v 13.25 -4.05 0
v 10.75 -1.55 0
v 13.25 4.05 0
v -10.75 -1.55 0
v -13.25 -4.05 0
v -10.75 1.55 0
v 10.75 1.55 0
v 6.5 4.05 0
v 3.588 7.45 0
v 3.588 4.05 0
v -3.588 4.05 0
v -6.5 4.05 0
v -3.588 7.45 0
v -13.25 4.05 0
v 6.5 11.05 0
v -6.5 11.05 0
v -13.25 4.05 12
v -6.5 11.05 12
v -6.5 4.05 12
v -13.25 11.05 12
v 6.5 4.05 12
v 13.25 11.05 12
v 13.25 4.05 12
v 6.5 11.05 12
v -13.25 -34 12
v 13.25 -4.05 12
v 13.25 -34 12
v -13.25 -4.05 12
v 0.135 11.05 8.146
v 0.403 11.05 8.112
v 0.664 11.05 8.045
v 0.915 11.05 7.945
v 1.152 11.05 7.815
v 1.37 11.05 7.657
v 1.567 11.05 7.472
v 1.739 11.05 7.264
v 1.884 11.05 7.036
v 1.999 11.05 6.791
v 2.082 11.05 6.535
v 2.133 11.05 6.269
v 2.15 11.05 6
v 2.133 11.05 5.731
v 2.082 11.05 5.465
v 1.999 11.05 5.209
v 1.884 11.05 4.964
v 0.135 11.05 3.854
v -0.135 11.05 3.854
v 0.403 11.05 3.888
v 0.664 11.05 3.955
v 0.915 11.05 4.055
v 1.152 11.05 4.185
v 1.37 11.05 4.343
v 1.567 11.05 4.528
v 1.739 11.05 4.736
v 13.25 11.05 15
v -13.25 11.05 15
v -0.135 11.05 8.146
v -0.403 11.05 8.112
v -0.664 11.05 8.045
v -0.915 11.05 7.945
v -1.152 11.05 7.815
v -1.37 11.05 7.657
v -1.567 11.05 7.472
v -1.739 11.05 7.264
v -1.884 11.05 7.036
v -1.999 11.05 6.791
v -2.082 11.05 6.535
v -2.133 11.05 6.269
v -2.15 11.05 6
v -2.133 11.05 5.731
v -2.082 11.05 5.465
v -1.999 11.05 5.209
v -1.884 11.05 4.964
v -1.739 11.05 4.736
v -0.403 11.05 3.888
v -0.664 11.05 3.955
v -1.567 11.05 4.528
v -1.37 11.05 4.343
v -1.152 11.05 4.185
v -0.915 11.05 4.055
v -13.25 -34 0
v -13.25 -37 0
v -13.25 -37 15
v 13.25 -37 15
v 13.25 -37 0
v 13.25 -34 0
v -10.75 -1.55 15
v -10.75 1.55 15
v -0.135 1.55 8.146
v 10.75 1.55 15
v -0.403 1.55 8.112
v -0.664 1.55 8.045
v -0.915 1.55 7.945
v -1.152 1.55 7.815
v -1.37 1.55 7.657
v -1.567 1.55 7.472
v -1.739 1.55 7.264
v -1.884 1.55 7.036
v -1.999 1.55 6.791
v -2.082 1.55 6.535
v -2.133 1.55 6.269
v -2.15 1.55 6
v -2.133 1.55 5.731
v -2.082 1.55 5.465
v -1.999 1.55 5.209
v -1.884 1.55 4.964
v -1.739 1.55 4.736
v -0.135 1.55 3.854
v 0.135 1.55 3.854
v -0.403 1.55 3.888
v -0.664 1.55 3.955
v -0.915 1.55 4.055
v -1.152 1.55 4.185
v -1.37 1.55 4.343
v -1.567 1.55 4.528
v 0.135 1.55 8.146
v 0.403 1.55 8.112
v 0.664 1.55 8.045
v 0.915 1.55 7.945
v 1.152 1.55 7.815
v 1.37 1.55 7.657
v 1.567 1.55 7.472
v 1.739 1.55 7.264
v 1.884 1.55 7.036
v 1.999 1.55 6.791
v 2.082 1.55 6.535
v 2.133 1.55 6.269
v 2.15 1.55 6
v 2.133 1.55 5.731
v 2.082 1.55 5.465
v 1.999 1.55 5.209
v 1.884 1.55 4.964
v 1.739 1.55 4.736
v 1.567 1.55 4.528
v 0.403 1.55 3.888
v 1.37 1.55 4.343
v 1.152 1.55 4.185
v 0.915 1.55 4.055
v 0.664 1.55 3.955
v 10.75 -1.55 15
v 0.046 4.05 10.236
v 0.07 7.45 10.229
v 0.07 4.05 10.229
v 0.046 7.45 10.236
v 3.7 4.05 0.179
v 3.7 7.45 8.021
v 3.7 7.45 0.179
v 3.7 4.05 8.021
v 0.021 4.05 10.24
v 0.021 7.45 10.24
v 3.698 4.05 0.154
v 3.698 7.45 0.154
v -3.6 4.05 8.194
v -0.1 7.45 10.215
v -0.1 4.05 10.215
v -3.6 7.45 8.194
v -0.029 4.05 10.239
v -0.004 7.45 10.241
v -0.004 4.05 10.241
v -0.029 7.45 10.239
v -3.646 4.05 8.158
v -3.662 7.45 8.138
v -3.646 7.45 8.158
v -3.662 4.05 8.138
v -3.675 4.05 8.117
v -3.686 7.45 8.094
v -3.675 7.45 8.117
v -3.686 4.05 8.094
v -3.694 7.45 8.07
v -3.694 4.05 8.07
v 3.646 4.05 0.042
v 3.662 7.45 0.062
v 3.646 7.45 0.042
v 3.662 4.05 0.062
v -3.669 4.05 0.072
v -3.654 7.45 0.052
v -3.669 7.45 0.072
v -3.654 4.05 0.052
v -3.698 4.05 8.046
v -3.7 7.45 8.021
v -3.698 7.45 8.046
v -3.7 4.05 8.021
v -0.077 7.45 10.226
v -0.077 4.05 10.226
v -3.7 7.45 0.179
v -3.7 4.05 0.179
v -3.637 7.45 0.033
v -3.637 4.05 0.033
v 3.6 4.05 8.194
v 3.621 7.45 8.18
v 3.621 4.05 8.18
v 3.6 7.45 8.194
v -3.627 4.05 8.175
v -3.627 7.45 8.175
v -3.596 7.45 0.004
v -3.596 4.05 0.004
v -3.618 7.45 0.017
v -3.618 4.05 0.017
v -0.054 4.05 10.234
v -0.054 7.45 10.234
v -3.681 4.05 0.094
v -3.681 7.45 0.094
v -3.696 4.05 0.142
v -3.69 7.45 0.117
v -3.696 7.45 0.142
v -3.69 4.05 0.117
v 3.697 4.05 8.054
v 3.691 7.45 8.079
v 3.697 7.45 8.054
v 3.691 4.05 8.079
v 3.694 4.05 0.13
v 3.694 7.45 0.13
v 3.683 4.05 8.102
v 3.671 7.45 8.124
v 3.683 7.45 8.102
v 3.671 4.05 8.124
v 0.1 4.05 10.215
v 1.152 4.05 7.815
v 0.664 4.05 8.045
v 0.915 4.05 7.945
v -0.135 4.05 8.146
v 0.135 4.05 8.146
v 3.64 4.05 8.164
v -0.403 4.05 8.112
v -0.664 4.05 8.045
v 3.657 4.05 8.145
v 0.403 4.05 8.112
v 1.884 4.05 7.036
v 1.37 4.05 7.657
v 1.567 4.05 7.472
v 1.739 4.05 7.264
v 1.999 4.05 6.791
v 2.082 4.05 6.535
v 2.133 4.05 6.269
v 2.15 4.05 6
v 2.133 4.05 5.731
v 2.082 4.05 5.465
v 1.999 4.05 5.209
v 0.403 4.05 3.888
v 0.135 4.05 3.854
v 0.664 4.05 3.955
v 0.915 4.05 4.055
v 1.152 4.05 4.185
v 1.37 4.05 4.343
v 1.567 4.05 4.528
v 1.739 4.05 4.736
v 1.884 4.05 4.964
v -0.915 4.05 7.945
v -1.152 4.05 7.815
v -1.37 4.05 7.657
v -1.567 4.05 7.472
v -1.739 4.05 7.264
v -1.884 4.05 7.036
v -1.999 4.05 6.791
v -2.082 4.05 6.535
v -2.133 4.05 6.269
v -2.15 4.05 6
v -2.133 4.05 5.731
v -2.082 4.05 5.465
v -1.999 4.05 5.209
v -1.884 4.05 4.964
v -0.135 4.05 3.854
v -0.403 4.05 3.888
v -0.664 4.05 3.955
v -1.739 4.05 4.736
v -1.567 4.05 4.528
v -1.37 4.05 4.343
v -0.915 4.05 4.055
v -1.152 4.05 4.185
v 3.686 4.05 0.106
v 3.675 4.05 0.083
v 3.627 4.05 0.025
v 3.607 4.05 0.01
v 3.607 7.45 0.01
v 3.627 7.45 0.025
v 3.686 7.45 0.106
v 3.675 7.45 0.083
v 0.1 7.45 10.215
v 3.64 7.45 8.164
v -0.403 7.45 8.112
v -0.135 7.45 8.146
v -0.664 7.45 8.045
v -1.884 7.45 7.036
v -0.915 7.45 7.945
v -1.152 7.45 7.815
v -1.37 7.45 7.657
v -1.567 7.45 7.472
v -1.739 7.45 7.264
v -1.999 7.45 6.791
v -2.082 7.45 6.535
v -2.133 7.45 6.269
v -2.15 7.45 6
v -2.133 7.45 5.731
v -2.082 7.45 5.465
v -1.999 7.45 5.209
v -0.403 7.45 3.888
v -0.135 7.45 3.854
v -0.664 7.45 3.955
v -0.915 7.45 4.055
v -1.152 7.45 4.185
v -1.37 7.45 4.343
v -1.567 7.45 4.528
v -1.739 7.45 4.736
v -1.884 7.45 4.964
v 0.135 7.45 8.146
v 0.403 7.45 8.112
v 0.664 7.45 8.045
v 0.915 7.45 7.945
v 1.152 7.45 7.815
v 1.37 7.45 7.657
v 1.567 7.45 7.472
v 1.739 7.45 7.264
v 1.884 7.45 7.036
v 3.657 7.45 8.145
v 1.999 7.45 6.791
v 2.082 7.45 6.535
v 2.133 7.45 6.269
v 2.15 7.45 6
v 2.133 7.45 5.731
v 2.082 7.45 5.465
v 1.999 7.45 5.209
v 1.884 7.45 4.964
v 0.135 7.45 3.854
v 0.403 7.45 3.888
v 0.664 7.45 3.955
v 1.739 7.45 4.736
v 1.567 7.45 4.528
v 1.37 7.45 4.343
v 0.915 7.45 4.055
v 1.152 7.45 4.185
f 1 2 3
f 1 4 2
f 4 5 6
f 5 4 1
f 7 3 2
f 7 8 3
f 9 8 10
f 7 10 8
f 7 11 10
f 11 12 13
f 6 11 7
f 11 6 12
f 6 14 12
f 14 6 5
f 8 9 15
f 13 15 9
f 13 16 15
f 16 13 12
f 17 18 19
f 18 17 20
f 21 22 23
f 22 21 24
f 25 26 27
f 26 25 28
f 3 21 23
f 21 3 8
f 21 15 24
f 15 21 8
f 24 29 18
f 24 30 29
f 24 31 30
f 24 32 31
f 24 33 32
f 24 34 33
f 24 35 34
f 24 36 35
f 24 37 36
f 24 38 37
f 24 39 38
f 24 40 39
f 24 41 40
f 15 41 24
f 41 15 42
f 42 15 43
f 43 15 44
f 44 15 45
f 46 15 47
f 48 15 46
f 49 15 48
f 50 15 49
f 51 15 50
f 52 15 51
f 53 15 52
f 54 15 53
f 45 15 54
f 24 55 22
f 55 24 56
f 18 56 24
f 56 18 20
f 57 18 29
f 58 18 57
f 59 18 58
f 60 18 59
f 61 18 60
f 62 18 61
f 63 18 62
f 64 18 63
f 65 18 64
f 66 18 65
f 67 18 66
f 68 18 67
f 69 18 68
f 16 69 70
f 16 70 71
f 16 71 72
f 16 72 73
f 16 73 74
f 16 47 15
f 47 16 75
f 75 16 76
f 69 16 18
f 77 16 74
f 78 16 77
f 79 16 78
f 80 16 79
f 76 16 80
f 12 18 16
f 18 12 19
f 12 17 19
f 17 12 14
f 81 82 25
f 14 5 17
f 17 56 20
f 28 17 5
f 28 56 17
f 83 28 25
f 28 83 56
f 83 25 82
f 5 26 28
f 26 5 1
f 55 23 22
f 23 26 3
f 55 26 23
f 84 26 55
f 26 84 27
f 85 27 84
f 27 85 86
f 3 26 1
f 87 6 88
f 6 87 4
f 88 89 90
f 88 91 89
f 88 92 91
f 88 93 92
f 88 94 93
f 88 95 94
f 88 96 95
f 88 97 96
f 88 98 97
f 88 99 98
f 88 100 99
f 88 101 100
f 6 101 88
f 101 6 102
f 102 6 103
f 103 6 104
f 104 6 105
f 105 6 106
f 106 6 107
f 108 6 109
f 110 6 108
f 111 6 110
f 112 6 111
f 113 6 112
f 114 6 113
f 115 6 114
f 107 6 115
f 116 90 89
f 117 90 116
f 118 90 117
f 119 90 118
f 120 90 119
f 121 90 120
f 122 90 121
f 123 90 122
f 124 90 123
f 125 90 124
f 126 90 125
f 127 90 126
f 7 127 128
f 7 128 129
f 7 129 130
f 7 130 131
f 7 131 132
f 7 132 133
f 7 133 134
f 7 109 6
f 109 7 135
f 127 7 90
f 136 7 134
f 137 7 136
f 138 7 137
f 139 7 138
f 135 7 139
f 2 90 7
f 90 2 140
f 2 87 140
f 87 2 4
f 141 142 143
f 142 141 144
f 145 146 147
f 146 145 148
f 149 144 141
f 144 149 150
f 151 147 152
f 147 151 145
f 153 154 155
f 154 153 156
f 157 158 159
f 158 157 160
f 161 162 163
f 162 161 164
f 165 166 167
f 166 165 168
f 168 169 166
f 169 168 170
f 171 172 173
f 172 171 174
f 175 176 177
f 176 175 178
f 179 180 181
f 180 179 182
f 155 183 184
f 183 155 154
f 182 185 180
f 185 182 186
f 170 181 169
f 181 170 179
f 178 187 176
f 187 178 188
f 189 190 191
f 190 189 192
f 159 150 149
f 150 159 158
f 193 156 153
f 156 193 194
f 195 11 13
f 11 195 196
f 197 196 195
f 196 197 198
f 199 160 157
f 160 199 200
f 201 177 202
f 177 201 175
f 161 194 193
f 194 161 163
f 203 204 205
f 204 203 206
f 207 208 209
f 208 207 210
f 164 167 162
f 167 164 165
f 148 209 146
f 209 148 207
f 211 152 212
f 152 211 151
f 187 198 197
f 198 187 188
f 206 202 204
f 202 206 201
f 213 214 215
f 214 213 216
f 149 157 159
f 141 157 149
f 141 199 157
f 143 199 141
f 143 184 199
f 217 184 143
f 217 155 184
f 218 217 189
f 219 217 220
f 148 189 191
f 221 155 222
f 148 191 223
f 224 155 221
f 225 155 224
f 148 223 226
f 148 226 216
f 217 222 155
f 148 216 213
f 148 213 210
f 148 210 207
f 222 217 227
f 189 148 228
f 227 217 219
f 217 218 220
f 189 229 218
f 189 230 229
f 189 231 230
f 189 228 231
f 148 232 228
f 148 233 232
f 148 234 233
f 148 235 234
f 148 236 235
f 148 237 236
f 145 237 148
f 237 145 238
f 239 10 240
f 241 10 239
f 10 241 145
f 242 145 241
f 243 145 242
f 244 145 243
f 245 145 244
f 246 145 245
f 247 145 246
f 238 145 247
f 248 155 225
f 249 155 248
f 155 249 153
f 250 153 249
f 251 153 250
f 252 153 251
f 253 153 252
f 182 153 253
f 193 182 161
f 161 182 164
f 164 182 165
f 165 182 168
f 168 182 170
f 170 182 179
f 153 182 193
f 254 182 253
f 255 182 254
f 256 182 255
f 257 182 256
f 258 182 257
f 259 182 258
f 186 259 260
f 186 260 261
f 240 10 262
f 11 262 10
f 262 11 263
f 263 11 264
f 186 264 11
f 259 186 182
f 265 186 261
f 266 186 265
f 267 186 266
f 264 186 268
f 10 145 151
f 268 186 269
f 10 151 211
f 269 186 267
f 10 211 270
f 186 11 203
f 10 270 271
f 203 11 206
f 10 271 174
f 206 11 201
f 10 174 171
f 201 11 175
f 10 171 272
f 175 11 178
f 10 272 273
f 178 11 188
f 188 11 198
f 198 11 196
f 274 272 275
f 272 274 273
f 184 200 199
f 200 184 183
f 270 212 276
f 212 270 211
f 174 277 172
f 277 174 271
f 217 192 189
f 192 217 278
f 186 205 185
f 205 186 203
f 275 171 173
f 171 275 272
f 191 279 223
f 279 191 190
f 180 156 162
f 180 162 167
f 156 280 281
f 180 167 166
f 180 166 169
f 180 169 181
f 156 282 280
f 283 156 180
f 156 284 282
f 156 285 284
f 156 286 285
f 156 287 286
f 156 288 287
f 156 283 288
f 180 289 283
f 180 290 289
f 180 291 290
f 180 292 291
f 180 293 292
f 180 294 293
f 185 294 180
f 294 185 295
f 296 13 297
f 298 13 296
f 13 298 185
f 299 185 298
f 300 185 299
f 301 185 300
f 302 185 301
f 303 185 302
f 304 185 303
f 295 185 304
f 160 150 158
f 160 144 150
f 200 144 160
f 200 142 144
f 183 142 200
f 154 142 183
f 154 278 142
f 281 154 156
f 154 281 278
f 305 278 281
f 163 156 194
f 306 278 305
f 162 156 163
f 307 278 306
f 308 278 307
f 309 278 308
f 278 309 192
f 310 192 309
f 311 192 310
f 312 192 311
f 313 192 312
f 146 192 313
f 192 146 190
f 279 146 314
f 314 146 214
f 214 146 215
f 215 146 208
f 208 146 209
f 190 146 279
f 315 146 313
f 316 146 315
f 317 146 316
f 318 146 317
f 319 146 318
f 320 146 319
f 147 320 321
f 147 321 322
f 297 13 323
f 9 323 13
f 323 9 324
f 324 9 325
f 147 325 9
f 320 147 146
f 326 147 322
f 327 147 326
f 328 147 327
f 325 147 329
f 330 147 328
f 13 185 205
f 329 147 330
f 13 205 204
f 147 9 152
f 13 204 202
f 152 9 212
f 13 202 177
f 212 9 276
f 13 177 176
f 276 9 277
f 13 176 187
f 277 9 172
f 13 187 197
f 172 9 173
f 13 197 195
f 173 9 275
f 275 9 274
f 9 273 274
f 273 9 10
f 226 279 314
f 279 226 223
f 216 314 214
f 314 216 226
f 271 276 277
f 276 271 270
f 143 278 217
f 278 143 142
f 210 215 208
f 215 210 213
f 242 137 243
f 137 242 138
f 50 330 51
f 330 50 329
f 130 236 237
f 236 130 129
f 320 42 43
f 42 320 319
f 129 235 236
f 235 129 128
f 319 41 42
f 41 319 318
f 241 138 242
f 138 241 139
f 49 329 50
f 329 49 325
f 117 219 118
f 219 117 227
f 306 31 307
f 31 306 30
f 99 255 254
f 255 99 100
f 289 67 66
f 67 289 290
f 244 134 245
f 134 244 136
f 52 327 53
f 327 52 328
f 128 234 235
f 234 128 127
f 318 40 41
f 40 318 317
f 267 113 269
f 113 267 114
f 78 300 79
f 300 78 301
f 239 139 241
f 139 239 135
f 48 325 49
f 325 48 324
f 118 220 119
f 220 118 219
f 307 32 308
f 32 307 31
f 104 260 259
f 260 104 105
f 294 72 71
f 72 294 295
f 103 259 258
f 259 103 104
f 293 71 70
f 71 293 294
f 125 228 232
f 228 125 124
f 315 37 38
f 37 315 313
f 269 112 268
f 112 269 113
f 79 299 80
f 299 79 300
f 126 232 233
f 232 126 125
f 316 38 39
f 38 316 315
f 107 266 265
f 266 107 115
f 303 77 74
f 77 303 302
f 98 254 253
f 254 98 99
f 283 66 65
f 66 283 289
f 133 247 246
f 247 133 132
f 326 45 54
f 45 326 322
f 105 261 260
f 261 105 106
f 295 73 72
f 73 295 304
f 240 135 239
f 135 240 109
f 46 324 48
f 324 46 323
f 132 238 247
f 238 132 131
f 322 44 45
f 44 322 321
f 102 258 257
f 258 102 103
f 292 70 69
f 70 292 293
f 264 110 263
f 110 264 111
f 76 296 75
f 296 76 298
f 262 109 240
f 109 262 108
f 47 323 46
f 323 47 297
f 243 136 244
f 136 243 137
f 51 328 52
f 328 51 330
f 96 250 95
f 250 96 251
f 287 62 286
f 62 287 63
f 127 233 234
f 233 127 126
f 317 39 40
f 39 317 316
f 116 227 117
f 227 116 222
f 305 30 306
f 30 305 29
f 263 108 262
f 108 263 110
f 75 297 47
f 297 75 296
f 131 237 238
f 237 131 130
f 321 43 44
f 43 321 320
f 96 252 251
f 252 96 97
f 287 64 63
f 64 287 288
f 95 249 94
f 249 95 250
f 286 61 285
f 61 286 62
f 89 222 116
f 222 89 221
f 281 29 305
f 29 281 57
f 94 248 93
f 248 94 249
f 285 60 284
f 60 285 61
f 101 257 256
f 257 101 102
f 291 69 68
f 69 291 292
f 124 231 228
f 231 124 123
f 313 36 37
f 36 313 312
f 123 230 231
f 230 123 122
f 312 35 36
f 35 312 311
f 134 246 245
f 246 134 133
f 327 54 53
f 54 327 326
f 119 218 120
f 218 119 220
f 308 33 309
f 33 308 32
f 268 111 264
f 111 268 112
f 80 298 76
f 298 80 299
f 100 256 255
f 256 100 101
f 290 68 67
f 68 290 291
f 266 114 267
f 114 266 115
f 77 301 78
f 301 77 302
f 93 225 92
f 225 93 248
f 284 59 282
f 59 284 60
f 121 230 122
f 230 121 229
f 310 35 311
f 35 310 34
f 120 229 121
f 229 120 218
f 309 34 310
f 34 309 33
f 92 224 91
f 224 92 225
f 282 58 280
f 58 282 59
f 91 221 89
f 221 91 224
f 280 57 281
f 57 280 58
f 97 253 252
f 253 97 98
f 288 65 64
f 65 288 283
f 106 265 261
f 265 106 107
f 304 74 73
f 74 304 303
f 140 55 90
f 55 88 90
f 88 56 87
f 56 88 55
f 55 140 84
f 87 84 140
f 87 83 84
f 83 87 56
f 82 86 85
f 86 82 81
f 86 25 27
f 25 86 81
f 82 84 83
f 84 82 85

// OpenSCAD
/* [Parameters] */
$fn=50;
barDims=[20.5,1000,2.1]; //Dimensions of the raw bar to engrave
subStrokeDims=[10,0.3];
mainStrokeDims=[18,0.6];
firstStrokeOffset=7; //2 litres at39mm
textOffset=[-4,1];
textSize=8;
kettleDia=280;
kettleRim=30;
litresPerDiv=2; //litres per division
litresPerSubdiv=1; //litres per sub-division
maxLitres=30; //maximum litres
wallThck=3;
hldrHght=15;
spcng=0.5;
fudge=0.1;

/* [Hidden] */
mmPerDiv=litres2height(litresPerDiv,kettleDia);
mmPerSubdiv=litres2height(litresPerSubdiv,kettleDia);

holder();
module holder(){
  screwOffset=(hldrHght-wallThck)/2;
  hldrOvDims=[barDims.x+wallThck*2,kettleRim+wallThck*3+barDims.z+spcng*2+3];
  difference(){
    linear_extrude(screwOffset*2,convexity=3) difference(){
      union(){
        square([barDims.x+wallThck*2,barDims.z+wallThck*2],true);
        translate([0,barDims.z/2+(4+wallThck*2)/2+spcng]) square([7+wallThck*2,3+wallThck*2],true);
      }
      square([barDims.x+spcng*2,barDims.z+spcng*2],true);
    }
    translate([0,(barDims.z)/2+wallThck,screwOffset]) rotate([-90,0,0]){
      M4Nut();
      }
      translate([0,0,screwOffset]) rotate([-90,0,0]) cylinder(d=4.3,h=15);
    
    }
  translate([0,0,hldrHght-wallThck]) linear_extrude(wallThck) difference(){
    translate([0,-11.5]) square([hldrOvDims.x,hldrOvDims.y],true);
    square([barDims.x+spcng*2,barDims.z+spcng*2],true);
  }
    
  translate([0,-35.50,hldrHght/2]) cube([hldrOvDims.x,wallThck,hldrHght],true);
}

module marking(){
  color("lightgrey") translate([0,0,barDims.z])
    for (i=[1:(maxLitres/litresPerSubdiv)]){
      //if (mmPerDiv/i*mmPerSubDiv)
      if (i*litresPerSubdiv%(litresPerDiv)) //subDiv
        translate([0,i*mmPerSubdiv-subStrokeDims.y/2+firstStrokeOffset]) square(subStrokeDims);
      else //mainDiv
        translate([0,i*mmPerSubdiv+firstStrokeOffset]){
          translate([0,-mainStrokeDims.y/2]) square(mainStrokeDims);
          translate([subStrokeDims.x,0]+textOffset) text(str(i*litresPerSubdiv),size=textSize);
        }
    }
  echo(mm2Litres(470,280));
  echo(litres2height(28.9,280));
}

*M4Nut();
module M4Nut(spcng=0.2){
  s=7;
  dia=ri2ro(s,6);
  linear_extrude(3+spcng*2) offset(spcng) {
    rotate(180/6) circle(d=dia,$fn=6);
    translate([0,hldrHght/4]) square([s,dia/2+fudge],true);
    }
}

function mm2Litres(height,dia)=pow(dia/200,2)*PI*height/100;

function litres2height(litres,dia)=litres/(pow(dia/200,2)*PI/100);

// -- helper Functions -- 
function ri2ro(ri,N)=ri/cos(180/N);
function ri2a(ri,N)=2*ri*tan(180/N);
